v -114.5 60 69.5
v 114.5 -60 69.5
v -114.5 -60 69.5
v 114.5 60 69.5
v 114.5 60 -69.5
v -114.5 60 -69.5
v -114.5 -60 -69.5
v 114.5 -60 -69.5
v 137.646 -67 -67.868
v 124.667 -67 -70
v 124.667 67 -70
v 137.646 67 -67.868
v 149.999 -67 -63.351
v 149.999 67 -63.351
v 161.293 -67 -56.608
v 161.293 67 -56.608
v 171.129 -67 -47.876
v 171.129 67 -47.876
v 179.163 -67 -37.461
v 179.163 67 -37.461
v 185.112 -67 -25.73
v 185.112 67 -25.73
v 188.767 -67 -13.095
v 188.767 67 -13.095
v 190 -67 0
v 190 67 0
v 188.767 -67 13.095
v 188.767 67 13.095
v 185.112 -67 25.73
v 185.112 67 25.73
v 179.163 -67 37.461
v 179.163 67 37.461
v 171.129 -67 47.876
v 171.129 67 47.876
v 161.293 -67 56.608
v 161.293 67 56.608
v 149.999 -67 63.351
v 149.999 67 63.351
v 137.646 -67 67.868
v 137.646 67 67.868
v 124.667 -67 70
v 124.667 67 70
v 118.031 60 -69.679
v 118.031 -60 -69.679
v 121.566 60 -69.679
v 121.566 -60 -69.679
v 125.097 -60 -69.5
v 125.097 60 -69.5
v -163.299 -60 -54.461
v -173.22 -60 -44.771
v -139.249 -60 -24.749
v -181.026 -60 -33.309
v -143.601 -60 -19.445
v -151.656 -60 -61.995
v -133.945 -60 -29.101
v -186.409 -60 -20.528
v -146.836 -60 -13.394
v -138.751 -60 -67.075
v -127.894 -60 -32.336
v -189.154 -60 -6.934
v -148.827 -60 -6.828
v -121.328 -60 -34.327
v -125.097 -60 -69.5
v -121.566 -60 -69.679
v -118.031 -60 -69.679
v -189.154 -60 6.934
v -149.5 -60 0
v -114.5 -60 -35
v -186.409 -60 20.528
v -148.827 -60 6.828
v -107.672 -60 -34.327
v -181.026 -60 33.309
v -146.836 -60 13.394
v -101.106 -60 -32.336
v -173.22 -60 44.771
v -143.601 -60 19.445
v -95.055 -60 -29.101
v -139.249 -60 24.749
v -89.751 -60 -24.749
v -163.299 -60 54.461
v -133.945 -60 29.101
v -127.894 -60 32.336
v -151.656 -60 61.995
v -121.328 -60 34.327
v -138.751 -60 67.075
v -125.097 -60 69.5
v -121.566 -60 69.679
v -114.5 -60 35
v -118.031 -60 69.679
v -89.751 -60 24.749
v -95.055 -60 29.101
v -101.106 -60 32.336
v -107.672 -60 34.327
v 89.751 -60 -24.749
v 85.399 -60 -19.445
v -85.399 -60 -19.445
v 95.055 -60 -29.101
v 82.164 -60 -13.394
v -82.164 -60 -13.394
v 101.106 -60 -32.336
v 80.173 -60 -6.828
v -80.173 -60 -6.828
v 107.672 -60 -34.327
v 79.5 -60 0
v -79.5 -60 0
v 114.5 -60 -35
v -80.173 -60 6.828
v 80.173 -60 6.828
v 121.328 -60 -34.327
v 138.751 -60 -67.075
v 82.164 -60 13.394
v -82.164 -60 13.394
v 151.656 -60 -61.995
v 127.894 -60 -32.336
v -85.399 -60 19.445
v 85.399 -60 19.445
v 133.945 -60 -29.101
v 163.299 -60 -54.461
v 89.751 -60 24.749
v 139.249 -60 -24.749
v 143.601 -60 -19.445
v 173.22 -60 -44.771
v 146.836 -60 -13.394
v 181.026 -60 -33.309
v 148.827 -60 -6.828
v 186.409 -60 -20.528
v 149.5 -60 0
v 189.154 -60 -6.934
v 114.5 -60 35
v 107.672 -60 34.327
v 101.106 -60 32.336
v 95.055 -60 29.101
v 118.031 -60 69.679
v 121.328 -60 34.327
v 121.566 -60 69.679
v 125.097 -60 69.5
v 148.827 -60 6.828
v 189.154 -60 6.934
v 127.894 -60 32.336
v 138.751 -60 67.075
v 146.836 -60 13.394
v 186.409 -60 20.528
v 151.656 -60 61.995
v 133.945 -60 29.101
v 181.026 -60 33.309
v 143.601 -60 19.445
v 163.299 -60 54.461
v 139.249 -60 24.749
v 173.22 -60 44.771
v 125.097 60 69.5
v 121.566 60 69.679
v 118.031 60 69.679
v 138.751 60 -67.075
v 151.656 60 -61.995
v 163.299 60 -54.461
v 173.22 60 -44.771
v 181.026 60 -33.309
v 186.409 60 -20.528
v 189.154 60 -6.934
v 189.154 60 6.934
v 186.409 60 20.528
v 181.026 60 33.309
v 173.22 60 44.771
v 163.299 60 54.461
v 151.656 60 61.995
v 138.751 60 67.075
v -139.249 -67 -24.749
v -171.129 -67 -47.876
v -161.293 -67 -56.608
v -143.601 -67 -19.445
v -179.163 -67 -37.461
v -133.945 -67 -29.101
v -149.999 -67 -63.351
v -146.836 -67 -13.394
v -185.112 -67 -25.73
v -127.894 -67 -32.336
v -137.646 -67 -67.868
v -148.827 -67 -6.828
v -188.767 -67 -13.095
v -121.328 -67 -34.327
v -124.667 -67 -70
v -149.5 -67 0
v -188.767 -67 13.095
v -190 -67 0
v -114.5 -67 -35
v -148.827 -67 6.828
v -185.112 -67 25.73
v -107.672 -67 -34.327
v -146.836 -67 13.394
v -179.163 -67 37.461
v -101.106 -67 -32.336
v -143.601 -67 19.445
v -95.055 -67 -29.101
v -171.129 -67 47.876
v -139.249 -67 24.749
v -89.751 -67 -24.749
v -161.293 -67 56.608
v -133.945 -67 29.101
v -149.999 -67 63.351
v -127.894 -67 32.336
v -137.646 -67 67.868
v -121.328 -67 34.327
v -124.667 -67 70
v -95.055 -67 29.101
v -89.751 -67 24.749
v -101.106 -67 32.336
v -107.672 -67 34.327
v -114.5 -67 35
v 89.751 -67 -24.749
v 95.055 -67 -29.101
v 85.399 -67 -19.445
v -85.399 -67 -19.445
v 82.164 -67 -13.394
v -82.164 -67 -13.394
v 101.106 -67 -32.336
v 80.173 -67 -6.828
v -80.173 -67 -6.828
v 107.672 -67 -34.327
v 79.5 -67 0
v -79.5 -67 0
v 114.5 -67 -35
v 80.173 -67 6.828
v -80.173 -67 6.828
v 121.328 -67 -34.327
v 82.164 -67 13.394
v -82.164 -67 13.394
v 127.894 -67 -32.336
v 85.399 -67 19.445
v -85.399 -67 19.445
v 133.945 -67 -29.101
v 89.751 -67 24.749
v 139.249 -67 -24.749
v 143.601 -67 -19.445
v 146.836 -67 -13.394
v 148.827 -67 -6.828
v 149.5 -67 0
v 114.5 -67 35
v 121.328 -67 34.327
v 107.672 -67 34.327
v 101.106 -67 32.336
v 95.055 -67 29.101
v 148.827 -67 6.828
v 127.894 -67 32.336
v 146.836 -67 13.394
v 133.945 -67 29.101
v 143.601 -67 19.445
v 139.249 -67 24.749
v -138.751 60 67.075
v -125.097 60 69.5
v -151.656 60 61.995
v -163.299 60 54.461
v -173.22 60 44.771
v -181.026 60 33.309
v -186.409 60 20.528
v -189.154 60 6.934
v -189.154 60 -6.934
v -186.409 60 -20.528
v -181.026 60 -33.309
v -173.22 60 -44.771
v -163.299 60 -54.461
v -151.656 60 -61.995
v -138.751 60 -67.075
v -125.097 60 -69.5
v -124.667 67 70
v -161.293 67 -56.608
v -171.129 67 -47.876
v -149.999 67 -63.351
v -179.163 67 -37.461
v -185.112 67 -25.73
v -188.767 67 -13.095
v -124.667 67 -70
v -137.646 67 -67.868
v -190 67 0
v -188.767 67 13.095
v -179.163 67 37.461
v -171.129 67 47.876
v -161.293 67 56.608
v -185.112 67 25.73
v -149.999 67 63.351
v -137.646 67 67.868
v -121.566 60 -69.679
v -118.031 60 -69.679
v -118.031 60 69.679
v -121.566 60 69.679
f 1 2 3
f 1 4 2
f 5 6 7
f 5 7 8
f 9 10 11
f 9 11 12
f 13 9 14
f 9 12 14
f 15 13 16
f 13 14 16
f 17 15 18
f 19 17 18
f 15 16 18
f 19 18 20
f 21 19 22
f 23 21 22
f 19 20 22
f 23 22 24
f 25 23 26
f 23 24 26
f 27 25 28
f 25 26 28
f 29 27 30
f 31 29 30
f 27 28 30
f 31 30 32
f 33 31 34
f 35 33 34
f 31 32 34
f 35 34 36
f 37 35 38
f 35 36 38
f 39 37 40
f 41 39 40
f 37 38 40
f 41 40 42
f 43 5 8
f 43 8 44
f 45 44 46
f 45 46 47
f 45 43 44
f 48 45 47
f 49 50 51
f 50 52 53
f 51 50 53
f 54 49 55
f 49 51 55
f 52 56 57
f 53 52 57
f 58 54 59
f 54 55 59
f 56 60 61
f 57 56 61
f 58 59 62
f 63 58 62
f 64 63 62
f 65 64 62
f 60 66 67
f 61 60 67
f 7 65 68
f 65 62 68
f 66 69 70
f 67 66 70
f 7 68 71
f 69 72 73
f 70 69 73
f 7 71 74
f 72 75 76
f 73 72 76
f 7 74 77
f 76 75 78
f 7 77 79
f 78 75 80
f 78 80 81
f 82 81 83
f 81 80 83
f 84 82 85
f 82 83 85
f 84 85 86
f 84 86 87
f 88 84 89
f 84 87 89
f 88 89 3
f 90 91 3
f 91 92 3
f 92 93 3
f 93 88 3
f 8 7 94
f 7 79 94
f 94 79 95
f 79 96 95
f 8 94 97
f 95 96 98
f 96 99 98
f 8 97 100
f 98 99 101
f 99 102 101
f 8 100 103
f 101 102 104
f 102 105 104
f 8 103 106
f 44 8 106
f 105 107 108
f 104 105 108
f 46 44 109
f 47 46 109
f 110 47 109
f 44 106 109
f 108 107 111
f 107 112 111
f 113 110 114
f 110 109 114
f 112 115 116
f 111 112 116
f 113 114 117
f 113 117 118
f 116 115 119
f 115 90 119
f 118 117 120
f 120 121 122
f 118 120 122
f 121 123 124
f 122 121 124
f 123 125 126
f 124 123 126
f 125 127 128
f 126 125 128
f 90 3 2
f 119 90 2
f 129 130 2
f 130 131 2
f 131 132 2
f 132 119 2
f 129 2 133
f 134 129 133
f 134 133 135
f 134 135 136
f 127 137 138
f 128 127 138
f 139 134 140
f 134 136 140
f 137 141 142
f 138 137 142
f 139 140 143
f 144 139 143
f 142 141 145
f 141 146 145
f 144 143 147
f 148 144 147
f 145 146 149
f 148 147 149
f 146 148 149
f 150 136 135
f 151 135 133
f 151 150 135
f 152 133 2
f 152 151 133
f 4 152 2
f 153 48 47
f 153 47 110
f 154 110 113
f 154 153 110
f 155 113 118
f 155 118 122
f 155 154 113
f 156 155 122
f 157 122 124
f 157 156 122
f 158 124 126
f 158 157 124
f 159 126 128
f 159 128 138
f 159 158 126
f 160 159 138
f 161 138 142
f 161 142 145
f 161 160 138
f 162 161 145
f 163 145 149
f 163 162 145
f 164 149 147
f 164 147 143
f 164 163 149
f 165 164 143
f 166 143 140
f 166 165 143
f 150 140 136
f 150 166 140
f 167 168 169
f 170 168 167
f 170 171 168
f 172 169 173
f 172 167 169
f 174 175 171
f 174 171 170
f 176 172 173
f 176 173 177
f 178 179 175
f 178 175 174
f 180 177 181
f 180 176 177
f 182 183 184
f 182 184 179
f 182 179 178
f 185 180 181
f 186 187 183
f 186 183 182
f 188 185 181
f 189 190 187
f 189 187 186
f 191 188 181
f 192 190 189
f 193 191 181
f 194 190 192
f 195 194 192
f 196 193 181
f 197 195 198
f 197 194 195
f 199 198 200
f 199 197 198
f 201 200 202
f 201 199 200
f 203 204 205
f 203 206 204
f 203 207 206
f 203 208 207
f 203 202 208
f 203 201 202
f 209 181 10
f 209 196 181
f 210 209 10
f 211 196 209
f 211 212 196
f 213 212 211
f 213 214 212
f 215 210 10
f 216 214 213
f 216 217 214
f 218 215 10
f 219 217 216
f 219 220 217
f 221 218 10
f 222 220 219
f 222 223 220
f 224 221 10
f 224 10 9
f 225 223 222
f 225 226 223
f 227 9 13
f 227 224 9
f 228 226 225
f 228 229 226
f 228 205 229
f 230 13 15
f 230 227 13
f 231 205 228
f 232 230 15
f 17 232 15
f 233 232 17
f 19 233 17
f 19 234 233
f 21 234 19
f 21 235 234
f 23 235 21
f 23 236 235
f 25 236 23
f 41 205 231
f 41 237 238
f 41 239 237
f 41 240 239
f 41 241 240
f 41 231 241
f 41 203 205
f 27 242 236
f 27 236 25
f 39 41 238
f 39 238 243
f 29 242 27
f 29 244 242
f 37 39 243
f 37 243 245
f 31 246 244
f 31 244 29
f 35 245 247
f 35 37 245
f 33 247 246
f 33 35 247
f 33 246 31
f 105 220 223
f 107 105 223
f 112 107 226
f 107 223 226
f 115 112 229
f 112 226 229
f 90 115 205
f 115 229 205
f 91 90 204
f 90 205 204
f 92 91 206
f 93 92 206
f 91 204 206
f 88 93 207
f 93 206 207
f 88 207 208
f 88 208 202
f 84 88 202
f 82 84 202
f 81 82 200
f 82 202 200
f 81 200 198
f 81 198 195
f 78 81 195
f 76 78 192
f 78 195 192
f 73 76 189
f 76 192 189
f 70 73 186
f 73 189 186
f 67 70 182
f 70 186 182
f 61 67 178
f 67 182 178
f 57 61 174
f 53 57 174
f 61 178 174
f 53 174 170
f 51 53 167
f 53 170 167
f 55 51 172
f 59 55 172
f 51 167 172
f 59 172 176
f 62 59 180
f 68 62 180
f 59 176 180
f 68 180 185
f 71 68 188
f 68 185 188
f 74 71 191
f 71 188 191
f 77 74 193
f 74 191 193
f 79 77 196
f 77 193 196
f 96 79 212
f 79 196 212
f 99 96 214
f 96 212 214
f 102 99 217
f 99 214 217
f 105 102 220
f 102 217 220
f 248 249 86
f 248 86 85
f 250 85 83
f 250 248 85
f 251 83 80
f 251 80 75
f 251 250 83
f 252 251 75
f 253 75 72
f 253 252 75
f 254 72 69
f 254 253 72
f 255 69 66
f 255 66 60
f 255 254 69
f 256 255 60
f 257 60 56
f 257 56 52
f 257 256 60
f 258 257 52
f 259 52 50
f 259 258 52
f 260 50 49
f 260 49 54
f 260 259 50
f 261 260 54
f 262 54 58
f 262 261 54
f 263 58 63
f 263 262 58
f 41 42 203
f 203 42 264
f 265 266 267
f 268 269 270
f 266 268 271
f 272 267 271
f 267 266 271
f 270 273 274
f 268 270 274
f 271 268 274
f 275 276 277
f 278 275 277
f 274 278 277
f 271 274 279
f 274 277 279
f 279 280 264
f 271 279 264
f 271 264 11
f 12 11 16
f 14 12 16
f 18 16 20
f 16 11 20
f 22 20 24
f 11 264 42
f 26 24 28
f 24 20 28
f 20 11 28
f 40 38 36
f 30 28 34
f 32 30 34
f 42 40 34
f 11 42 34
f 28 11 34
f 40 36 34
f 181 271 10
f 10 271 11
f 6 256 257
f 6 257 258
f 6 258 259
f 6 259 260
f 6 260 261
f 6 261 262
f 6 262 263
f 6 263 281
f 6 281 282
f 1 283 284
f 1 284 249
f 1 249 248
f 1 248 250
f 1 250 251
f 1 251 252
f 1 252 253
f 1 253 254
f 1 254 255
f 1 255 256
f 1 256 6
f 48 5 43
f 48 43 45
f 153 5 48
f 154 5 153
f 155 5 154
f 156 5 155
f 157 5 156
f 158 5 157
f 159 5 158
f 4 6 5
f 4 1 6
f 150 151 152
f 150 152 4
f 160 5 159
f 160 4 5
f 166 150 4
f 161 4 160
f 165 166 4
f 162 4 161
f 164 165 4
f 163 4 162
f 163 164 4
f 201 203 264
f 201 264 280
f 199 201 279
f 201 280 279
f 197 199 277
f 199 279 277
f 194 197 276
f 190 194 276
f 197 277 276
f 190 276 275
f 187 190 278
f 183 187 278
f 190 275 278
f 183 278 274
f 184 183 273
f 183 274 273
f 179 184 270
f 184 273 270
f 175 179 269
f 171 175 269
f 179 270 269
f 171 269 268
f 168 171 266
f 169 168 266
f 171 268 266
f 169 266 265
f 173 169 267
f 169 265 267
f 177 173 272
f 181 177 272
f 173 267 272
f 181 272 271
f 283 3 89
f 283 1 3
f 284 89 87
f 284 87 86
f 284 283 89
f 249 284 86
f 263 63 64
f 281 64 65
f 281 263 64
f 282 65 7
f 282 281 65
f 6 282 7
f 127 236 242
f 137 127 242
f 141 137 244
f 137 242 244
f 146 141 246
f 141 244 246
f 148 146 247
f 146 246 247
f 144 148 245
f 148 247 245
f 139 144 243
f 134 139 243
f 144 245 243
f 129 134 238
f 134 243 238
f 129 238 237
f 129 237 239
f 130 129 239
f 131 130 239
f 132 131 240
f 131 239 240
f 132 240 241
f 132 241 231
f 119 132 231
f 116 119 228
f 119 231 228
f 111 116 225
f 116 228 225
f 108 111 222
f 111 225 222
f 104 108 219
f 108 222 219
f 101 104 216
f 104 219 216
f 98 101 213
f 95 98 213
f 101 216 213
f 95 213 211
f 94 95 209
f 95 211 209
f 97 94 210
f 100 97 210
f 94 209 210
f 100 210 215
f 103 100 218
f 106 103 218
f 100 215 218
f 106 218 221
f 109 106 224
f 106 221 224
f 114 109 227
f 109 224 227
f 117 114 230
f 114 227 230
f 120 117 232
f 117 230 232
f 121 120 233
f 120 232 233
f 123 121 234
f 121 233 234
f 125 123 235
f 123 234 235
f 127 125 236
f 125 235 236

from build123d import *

# Parameters (mm, degrees)
F1_DEPTH = 67
F3_DEPTH = 60
F5_R     = 35
F6_DEPTH = 7


with BuildPart() as f1:
    # F0 (on Front) → F1 (new body)
    with BuildSketch(Plane.XZ):
        with BuildLine():
            Line((-115, 70), (-124.666667, 70))
            ThreePointArc((-124.666667, 70), (-190, 0), (-124.666667, -70))
            Line((-124.666667, -70), (-115, -70))
            Line((-115, -70), (115, -70))
            Line((115, -70), (124.666667, -70))
            ThreePointArc((124.666667, -70), (190, 0), (124.666667, 70))
            Line((124.666667, 70), (115, 70))
            Line((115, 70), (-115, 70))
        make_face()
    extrude(amount=-F1_DEPTH)

    # F2 (on face) → F3 (cut)
    with BuildSketch(Plane.XZ):
        with BuildLine():
            ThreePointArc((-114.5, 69.5), (-119.798333, 69.701667), (-125.096667, 69.5))
            Line((-125.096667, 69.5), (-114.5, 69.5))
        make_face()
        with BuildLine():
            Line((-114.5, 69.5), (-125.096667, 69.5))
            ThreePointArc((-125.096667, 69.5), (-189.5, 0), (-125.096667, -69.5))
            Line((-125.096667, -69.5), (-114.5, -69.5))
            Line((-114.5, -69.5), (114.5, -69.5))
            Line((114.5, -69.5), (125.096667, -69.5))
            ThreePointArc((125.096667, -69.5), (189.5, 0), (125.096667, 69.5))
            Line((125.096667, 69.5), (114.5, 69.5))
            Line((114.5, 69.5), (-114.5, 69.5))
        make_face()
        with BuildLine():
            Line((-114.5, -69.5), (-125.096667, -69.5))
            ThreePointArc((-125.096667, -69.5), (-119.798333, -69.701667), (-114.5, -69.5))
        make_face()
        with BuildLine():
            ThreePointArc((125.096667, 69.5), (119.798333, 69.701667), (114.5, 69.5))
            Line((114.5, 69.5), (125.096667, 69.5))
        make_face()
        with BuildLine():
            Line((125.096667, -69.5), (114.5, -69.5))
            ThreePointArc((114.5, -69.5), (119.798333, -69.701667), (125.096667, -69.5))
        make_face()
    extrude(amount=-F3_DEPTH, mode=Mode.SUBTRACT)

    # F4: F1 across face


with BuildPart() as f1_1:
    add(f1.part)
    add(f1.part.mirror(Plane.XZ))

    # F5 (on face) → F6 (cut, through all)
    with BuildSketch(Plane.XZ.offset(67)):
        with Locations((-114.5, 0)):
            Circle(F5_R)
        with Locations((114.5, 0)):
            Circle(F5_R)
    extrude(amount=-F6_DEPTH, mode=Mode.SUBTRACT)


solid = f1_1.part
